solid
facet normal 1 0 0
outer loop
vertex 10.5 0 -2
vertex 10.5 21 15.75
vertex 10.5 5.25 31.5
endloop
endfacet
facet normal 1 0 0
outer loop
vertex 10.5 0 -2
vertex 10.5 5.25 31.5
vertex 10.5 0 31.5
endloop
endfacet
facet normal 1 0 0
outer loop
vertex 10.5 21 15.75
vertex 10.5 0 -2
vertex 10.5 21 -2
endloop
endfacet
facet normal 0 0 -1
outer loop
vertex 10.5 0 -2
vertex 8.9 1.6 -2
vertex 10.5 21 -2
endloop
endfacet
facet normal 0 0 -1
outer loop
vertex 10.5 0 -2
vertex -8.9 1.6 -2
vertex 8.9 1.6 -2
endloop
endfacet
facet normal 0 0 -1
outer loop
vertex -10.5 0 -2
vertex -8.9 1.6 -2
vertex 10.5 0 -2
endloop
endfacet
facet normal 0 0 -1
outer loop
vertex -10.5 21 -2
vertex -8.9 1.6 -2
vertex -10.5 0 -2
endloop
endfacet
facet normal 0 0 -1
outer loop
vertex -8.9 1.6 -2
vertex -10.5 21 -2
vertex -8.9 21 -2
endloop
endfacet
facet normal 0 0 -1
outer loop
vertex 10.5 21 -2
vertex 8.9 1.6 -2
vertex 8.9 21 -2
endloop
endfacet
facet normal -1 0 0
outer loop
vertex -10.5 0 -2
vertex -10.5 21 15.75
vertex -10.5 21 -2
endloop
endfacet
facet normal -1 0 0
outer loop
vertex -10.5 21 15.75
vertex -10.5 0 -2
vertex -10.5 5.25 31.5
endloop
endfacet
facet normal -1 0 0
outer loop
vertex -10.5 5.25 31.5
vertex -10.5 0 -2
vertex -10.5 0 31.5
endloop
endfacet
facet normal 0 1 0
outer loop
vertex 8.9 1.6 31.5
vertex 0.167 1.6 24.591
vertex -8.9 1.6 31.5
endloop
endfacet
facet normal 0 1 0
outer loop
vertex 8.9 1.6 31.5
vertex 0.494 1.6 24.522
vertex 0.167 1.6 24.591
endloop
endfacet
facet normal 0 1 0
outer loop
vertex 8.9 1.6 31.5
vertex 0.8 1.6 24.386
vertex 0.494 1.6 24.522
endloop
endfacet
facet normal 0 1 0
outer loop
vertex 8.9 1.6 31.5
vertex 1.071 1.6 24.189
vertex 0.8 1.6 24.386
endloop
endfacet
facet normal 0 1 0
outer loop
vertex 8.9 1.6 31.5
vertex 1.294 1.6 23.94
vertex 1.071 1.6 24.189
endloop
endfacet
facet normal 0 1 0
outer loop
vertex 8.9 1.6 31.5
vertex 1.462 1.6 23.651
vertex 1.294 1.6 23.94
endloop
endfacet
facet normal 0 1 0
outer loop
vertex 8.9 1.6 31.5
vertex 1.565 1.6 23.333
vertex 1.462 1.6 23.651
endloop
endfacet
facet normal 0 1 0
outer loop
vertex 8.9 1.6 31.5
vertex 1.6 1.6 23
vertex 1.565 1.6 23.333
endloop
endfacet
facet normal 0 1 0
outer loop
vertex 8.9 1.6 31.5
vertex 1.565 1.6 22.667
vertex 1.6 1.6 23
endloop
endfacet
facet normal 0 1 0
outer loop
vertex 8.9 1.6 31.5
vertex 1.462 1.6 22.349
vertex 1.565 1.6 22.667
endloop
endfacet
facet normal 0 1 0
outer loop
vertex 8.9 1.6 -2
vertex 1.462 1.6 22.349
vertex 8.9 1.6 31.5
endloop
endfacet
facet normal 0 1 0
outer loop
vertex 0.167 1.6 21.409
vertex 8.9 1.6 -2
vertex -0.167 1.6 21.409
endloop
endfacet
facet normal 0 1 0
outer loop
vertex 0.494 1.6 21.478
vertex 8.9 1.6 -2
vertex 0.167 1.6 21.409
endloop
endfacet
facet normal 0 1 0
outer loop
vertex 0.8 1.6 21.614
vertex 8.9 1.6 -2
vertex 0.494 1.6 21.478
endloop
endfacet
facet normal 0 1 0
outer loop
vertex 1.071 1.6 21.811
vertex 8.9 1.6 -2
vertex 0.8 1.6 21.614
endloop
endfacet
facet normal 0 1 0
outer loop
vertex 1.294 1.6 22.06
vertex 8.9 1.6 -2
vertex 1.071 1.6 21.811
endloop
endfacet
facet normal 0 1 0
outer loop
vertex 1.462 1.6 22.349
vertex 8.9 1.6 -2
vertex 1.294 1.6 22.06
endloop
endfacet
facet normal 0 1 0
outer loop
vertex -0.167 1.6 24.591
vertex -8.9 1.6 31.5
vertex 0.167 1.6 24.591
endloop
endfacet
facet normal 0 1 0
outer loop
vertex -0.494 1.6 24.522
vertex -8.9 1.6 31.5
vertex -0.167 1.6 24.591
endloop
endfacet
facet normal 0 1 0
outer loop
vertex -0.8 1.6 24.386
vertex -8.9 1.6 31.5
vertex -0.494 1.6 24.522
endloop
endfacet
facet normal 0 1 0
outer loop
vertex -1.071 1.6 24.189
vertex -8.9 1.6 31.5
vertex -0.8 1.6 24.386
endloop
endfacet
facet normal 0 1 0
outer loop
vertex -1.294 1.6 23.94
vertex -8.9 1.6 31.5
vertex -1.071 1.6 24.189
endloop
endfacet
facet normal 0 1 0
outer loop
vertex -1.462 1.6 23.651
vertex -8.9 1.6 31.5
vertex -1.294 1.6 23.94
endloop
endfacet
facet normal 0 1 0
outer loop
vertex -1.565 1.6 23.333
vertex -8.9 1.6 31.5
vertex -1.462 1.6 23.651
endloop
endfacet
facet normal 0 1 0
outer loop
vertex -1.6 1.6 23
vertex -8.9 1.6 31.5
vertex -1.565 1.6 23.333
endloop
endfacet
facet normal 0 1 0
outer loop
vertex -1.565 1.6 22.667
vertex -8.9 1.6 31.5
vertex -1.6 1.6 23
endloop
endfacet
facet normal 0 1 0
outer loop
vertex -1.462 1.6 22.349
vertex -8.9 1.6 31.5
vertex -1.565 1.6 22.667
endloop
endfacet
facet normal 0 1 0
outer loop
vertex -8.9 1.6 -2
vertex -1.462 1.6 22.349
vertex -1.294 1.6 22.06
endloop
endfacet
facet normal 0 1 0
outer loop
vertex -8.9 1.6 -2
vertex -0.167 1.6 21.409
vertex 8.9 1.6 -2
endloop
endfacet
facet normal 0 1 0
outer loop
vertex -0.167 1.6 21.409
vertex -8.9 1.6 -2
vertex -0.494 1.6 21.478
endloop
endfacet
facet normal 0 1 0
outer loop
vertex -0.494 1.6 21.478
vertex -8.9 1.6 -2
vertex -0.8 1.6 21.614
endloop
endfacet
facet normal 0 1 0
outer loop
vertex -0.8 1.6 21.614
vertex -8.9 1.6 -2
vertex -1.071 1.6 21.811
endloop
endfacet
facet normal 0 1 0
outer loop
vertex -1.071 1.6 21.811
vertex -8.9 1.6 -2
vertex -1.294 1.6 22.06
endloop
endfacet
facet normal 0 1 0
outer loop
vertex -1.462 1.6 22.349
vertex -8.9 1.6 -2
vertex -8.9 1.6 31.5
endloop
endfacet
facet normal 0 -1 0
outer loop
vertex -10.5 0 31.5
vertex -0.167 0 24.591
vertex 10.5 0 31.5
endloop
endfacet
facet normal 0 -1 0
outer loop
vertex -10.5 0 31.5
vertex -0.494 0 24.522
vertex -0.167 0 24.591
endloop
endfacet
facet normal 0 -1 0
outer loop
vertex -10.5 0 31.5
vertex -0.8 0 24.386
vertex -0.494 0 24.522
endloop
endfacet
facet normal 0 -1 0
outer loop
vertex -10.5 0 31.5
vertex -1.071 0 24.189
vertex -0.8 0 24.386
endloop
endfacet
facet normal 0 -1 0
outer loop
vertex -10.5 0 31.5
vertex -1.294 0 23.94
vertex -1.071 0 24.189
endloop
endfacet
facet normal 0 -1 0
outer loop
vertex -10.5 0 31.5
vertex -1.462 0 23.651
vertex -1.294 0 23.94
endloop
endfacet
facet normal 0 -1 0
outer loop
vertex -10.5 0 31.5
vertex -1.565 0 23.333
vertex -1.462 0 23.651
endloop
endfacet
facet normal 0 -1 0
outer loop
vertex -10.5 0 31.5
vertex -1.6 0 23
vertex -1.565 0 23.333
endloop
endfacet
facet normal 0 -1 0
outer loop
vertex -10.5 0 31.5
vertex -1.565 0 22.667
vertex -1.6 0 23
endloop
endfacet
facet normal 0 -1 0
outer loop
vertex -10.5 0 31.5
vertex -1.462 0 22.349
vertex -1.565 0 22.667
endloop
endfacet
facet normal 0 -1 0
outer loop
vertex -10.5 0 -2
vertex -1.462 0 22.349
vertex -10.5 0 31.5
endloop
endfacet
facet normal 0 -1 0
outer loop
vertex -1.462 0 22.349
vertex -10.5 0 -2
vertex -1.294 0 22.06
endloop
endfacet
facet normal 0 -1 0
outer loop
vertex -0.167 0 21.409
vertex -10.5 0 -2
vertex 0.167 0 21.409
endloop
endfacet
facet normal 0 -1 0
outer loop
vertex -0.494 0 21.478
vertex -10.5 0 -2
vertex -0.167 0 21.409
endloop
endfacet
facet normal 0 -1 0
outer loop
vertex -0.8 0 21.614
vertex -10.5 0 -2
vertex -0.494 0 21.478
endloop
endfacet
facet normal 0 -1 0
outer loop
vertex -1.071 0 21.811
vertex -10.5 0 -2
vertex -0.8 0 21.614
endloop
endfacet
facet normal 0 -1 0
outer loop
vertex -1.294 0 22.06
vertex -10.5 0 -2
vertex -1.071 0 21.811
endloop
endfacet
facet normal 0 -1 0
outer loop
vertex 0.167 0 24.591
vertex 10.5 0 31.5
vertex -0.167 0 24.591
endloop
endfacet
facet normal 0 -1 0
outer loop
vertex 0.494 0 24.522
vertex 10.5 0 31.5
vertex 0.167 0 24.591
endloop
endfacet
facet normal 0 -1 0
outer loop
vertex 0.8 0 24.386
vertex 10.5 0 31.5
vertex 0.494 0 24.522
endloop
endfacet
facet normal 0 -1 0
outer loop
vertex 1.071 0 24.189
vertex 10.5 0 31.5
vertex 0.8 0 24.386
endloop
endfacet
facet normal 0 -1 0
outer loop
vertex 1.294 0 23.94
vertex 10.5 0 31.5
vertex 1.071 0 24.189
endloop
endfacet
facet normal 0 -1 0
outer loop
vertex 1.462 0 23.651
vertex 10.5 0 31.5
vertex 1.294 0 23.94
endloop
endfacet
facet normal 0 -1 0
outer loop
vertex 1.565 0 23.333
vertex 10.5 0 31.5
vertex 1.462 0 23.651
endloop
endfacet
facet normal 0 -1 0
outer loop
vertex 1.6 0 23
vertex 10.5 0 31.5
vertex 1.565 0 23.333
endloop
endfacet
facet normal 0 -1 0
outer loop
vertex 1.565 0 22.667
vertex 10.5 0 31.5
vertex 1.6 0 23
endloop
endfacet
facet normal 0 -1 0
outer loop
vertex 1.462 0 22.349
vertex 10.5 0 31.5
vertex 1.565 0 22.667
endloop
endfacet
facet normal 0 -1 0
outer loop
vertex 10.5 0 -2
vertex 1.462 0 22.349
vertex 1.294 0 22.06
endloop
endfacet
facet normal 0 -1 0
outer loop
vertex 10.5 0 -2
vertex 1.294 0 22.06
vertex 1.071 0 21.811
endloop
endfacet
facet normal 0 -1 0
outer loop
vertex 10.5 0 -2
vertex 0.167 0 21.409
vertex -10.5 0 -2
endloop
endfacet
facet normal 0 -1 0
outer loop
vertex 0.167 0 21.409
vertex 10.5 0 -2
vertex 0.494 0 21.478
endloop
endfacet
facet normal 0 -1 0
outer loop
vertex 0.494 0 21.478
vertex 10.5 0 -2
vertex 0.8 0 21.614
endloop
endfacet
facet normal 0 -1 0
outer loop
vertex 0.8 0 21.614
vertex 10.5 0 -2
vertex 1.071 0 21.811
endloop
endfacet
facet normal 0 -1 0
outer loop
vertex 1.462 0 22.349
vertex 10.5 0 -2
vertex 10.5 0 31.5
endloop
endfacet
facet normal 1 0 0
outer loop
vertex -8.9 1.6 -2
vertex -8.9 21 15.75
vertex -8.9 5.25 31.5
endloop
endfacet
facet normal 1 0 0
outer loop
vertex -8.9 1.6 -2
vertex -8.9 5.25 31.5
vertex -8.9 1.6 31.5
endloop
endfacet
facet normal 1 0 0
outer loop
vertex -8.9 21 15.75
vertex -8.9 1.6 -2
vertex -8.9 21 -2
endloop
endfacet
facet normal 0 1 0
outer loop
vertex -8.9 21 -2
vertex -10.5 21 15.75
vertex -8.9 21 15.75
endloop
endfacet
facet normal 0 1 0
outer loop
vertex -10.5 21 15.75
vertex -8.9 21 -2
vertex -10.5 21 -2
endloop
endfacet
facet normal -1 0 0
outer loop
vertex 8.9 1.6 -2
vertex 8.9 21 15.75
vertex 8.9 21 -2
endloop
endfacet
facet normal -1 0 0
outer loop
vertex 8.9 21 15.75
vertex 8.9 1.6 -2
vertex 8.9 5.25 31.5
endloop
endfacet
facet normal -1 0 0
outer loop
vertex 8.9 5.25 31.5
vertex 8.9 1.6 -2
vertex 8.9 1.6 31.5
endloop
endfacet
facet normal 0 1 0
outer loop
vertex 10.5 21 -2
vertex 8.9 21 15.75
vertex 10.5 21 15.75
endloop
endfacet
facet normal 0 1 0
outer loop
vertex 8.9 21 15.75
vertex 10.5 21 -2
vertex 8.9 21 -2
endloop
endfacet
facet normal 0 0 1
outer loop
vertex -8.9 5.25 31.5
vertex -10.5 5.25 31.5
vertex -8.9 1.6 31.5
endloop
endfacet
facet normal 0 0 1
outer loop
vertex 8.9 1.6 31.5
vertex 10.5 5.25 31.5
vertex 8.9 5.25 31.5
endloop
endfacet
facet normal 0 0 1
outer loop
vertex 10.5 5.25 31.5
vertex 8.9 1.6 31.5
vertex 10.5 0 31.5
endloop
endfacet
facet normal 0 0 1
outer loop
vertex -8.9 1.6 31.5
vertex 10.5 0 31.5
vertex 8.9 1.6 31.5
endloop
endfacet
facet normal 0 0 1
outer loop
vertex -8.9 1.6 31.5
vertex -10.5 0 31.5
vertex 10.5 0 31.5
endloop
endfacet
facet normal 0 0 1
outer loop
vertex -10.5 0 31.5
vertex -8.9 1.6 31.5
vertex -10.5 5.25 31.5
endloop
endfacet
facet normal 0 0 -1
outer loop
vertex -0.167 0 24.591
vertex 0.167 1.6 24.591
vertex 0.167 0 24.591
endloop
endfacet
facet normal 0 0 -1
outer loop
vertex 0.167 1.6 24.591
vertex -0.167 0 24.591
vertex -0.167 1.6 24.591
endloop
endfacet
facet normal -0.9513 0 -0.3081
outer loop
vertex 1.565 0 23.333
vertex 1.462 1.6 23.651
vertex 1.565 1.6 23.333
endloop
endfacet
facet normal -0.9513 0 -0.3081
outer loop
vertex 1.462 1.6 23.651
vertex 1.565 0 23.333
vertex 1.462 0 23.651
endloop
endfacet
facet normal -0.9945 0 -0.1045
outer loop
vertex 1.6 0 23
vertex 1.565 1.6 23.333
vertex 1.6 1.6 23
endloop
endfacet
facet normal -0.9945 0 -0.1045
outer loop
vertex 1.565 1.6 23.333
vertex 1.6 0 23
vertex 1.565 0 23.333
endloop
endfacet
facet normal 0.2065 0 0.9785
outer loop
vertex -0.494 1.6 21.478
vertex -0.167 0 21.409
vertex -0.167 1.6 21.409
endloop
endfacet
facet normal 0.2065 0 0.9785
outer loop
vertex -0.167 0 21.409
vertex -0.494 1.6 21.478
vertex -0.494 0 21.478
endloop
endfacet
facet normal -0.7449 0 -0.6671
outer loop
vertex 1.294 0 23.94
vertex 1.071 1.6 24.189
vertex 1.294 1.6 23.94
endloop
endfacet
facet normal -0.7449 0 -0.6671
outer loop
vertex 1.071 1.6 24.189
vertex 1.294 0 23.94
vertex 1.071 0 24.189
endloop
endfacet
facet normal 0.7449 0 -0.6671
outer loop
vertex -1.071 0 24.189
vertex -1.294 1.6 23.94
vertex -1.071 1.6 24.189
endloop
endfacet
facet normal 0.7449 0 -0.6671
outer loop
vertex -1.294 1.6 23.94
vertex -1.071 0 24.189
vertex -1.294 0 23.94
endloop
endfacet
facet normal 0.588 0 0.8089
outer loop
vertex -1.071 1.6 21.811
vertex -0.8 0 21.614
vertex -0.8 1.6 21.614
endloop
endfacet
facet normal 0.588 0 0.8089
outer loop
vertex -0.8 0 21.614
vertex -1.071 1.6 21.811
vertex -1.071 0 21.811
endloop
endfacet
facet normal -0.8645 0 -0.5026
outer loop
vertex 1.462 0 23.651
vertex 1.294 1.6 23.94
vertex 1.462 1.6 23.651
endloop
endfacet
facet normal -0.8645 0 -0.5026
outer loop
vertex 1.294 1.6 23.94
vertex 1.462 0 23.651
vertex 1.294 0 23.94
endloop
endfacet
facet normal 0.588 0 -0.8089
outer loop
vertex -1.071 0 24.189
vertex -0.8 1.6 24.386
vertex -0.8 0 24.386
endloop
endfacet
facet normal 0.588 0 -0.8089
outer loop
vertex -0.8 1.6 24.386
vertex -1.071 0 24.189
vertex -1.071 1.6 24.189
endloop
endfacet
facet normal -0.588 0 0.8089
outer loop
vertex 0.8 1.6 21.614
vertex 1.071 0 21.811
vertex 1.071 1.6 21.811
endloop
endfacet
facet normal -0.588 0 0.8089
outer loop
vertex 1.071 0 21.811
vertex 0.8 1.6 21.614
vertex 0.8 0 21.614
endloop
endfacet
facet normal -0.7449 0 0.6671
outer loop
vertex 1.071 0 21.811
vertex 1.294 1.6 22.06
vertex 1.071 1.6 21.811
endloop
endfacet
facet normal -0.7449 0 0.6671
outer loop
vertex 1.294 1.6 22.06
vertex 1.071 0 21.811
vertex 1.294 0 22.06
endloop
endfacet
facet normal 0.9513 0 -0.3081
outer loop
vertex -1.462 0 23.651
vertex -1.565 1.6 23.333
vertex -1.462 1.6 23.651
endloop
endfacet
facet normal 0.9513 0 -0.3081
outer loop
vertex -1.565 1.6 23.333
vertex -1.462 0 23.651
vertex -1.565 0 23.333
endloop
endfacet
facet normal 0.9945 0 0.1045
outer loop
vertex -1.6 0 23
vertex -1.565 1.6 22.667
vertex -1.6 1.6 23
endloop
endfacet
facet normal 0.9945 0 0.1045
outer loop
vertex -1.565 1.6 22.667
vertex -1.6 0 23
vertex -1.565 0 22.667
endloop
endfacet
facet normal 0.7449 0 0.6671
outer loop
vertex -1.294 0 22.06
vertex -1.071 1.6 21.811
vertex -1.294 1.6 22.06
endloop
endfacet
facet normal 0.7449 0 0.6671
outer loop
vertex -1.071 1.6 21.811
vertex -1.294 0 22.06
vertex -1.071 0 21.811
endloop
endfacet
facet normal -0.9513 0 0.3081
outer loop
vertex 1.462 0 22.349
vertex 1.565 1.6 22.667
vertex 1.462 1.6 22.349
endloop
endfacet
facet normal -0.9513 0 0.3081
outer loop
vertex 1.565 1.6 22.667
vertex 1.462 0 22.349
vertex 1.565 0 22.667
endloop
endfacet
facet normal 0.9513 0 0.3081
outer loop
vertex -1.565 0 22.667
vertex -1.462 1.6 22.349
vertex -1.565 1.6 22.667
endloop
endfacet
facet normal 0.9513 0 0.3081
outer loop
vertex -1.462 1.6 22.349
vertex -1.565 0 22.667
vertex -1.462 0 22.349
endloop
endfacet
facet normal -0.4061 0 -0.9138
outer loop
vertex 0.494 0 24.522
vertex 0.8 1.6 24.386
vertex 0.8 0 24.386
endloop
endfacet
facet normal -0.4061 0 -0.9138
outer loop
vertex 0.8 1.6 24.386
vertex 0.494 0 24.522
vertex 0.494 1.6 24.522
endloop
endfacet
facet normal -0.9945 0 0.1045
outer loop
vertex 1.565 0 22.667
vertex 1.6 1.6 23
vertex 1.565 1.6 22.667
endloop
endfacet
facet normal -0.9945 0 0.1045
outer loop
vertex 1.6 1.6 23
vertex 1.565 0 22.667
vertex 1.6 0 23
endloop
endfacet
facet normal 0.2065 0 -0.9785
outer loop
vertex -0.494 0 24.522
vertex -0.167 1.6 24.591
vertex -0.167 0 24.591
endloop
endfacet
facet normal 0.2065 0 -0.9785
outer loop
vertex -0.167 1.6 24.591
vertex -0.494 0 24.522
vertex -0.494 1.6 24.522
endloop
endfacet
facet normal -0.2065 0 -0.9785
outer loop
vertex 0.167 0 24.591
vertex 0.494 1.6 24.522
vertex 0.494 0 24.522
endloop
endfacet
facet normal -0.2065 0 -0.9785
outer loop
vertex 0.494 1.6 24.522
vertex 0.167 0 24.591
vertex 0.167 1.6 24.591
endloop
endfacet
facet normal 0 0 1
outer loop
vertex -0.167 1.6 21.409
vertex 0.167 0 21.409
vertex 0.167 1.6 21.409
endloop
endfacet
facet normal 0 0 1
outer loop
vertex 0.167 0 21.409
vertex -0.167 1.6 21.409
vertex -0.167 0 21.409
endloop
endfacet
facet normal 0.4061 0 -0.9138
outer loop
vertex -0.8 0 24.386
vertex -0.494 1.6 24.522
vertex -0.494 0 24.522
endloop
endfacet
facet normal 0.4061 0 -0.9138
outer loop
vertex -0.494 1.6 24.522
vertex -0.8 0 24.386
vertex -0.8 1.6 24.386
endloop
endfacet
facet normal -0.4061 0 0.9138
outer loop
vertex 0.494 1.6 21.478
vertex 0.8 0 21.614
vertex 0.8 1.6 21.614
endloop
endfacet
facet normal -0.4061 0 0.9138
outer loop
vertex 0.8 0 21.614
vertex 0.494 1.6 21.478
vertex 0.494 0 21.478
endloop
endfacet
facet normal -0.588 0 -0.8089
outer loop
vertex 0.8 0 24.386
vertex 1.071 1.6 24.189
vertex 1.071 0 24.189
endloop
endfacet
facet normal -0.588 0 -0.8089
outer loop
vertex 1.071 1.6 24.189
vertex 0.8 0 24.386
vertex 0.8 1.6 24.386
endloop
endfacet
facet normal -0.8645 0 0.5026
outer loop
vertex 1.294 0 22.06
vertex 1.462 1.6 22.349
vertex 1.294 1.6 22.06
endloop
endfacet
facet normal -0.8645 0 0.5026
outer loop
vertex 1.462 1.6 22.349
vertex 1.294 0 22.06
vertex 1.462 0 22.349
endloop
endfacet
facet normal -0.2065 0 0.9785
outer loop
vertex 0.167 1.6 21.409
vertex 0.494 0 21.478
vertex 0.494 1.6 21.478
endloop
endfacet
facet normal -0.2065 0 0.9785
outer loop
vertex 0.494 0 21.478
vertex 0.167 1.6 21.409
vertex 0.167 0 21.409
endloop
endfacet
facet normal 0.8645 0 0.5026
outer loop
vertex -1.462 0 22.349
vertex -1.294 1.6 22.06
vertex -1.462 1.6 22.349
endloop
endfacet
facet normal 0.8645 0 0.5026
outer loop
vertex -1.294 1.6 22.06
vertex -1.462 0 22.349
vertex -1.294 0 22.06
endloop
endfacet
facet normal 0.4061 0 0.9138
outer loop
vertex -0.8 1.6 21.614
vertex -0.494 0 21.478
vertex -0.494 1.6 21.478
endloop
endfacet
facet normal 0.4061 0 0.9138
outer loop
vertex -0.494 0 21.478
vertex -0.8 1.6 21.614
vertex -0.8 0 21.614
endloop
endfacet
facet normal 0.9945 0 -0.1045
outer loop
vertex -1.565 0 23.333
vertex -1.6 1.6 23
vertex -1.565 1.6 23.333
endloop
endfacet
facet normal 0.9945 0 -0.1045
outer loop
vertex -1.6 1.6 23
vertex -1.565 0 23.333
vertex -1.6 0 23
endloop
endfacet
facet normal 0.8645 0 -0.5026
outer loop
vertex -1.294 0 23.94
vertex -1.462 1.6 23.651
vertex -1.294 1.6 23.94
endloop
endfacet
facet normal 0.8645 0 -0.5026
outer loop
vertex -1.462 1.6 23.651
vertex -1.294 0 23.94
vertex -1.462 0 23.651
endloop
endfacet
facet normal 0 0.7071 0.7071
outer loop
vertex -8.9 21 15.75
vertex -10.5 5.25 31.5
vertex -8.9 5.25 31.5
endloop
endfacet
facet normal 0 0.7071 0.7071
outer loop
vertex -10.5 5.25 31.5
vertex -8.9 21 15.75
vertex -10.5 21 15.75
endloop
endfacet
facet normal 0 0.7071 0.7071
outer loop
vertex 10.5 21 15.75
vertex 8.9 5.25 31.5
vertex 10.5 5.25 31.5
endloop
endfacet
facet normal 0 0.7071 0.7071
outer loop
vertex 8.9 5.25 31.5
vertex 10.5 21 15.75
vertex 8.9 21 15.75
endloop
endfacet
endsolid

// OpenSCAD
arm_mount();

module arm_mount()
{
	$fs = 0.1;

	wall_thickness = 1.6;
	height = 21;
	frame_width = height;
	frame_height = height * 3 / 2;
    height_offset = 2;
		
	translate([-frame_width/2, 0, 0])
	{
		difference() {
			union() {
                
                    cube([frame_width, wall_thickness, frame_height]); 
                    cube([wall_thickness, frame_width, frame_height]);
                
				translate([frame_width - wall_thickness, 0, 0]) 
					cube([wall_thickness, frame_width, frame_height]);
                
                //structure above the line to connect
				translate([0, 0, -2]) {
                    cube([frame_width, wall_thickness, 4]); 
                    
                    cube([wall_thickness, frame_width, 4]);
                    
                    translate([frame_width - wall_thickness, 0, 0]) 
                        cube([wall_thickness, frame_width, 4]);
                }
			}
		
			rotate([90, 0, 0])
				translate([frame_width/2, height + height_offset, -wall_thickness - 1])
					cylinder(r=1.6, h=wall_thickness+2);
            
            translate([-1, 1.75 * frame_width, 0])
                rotate([45, 0, 0])
                    cube(size=[frame_width + 2, frame_width, 2*frame_height]);
			
		}
        
	}
}
